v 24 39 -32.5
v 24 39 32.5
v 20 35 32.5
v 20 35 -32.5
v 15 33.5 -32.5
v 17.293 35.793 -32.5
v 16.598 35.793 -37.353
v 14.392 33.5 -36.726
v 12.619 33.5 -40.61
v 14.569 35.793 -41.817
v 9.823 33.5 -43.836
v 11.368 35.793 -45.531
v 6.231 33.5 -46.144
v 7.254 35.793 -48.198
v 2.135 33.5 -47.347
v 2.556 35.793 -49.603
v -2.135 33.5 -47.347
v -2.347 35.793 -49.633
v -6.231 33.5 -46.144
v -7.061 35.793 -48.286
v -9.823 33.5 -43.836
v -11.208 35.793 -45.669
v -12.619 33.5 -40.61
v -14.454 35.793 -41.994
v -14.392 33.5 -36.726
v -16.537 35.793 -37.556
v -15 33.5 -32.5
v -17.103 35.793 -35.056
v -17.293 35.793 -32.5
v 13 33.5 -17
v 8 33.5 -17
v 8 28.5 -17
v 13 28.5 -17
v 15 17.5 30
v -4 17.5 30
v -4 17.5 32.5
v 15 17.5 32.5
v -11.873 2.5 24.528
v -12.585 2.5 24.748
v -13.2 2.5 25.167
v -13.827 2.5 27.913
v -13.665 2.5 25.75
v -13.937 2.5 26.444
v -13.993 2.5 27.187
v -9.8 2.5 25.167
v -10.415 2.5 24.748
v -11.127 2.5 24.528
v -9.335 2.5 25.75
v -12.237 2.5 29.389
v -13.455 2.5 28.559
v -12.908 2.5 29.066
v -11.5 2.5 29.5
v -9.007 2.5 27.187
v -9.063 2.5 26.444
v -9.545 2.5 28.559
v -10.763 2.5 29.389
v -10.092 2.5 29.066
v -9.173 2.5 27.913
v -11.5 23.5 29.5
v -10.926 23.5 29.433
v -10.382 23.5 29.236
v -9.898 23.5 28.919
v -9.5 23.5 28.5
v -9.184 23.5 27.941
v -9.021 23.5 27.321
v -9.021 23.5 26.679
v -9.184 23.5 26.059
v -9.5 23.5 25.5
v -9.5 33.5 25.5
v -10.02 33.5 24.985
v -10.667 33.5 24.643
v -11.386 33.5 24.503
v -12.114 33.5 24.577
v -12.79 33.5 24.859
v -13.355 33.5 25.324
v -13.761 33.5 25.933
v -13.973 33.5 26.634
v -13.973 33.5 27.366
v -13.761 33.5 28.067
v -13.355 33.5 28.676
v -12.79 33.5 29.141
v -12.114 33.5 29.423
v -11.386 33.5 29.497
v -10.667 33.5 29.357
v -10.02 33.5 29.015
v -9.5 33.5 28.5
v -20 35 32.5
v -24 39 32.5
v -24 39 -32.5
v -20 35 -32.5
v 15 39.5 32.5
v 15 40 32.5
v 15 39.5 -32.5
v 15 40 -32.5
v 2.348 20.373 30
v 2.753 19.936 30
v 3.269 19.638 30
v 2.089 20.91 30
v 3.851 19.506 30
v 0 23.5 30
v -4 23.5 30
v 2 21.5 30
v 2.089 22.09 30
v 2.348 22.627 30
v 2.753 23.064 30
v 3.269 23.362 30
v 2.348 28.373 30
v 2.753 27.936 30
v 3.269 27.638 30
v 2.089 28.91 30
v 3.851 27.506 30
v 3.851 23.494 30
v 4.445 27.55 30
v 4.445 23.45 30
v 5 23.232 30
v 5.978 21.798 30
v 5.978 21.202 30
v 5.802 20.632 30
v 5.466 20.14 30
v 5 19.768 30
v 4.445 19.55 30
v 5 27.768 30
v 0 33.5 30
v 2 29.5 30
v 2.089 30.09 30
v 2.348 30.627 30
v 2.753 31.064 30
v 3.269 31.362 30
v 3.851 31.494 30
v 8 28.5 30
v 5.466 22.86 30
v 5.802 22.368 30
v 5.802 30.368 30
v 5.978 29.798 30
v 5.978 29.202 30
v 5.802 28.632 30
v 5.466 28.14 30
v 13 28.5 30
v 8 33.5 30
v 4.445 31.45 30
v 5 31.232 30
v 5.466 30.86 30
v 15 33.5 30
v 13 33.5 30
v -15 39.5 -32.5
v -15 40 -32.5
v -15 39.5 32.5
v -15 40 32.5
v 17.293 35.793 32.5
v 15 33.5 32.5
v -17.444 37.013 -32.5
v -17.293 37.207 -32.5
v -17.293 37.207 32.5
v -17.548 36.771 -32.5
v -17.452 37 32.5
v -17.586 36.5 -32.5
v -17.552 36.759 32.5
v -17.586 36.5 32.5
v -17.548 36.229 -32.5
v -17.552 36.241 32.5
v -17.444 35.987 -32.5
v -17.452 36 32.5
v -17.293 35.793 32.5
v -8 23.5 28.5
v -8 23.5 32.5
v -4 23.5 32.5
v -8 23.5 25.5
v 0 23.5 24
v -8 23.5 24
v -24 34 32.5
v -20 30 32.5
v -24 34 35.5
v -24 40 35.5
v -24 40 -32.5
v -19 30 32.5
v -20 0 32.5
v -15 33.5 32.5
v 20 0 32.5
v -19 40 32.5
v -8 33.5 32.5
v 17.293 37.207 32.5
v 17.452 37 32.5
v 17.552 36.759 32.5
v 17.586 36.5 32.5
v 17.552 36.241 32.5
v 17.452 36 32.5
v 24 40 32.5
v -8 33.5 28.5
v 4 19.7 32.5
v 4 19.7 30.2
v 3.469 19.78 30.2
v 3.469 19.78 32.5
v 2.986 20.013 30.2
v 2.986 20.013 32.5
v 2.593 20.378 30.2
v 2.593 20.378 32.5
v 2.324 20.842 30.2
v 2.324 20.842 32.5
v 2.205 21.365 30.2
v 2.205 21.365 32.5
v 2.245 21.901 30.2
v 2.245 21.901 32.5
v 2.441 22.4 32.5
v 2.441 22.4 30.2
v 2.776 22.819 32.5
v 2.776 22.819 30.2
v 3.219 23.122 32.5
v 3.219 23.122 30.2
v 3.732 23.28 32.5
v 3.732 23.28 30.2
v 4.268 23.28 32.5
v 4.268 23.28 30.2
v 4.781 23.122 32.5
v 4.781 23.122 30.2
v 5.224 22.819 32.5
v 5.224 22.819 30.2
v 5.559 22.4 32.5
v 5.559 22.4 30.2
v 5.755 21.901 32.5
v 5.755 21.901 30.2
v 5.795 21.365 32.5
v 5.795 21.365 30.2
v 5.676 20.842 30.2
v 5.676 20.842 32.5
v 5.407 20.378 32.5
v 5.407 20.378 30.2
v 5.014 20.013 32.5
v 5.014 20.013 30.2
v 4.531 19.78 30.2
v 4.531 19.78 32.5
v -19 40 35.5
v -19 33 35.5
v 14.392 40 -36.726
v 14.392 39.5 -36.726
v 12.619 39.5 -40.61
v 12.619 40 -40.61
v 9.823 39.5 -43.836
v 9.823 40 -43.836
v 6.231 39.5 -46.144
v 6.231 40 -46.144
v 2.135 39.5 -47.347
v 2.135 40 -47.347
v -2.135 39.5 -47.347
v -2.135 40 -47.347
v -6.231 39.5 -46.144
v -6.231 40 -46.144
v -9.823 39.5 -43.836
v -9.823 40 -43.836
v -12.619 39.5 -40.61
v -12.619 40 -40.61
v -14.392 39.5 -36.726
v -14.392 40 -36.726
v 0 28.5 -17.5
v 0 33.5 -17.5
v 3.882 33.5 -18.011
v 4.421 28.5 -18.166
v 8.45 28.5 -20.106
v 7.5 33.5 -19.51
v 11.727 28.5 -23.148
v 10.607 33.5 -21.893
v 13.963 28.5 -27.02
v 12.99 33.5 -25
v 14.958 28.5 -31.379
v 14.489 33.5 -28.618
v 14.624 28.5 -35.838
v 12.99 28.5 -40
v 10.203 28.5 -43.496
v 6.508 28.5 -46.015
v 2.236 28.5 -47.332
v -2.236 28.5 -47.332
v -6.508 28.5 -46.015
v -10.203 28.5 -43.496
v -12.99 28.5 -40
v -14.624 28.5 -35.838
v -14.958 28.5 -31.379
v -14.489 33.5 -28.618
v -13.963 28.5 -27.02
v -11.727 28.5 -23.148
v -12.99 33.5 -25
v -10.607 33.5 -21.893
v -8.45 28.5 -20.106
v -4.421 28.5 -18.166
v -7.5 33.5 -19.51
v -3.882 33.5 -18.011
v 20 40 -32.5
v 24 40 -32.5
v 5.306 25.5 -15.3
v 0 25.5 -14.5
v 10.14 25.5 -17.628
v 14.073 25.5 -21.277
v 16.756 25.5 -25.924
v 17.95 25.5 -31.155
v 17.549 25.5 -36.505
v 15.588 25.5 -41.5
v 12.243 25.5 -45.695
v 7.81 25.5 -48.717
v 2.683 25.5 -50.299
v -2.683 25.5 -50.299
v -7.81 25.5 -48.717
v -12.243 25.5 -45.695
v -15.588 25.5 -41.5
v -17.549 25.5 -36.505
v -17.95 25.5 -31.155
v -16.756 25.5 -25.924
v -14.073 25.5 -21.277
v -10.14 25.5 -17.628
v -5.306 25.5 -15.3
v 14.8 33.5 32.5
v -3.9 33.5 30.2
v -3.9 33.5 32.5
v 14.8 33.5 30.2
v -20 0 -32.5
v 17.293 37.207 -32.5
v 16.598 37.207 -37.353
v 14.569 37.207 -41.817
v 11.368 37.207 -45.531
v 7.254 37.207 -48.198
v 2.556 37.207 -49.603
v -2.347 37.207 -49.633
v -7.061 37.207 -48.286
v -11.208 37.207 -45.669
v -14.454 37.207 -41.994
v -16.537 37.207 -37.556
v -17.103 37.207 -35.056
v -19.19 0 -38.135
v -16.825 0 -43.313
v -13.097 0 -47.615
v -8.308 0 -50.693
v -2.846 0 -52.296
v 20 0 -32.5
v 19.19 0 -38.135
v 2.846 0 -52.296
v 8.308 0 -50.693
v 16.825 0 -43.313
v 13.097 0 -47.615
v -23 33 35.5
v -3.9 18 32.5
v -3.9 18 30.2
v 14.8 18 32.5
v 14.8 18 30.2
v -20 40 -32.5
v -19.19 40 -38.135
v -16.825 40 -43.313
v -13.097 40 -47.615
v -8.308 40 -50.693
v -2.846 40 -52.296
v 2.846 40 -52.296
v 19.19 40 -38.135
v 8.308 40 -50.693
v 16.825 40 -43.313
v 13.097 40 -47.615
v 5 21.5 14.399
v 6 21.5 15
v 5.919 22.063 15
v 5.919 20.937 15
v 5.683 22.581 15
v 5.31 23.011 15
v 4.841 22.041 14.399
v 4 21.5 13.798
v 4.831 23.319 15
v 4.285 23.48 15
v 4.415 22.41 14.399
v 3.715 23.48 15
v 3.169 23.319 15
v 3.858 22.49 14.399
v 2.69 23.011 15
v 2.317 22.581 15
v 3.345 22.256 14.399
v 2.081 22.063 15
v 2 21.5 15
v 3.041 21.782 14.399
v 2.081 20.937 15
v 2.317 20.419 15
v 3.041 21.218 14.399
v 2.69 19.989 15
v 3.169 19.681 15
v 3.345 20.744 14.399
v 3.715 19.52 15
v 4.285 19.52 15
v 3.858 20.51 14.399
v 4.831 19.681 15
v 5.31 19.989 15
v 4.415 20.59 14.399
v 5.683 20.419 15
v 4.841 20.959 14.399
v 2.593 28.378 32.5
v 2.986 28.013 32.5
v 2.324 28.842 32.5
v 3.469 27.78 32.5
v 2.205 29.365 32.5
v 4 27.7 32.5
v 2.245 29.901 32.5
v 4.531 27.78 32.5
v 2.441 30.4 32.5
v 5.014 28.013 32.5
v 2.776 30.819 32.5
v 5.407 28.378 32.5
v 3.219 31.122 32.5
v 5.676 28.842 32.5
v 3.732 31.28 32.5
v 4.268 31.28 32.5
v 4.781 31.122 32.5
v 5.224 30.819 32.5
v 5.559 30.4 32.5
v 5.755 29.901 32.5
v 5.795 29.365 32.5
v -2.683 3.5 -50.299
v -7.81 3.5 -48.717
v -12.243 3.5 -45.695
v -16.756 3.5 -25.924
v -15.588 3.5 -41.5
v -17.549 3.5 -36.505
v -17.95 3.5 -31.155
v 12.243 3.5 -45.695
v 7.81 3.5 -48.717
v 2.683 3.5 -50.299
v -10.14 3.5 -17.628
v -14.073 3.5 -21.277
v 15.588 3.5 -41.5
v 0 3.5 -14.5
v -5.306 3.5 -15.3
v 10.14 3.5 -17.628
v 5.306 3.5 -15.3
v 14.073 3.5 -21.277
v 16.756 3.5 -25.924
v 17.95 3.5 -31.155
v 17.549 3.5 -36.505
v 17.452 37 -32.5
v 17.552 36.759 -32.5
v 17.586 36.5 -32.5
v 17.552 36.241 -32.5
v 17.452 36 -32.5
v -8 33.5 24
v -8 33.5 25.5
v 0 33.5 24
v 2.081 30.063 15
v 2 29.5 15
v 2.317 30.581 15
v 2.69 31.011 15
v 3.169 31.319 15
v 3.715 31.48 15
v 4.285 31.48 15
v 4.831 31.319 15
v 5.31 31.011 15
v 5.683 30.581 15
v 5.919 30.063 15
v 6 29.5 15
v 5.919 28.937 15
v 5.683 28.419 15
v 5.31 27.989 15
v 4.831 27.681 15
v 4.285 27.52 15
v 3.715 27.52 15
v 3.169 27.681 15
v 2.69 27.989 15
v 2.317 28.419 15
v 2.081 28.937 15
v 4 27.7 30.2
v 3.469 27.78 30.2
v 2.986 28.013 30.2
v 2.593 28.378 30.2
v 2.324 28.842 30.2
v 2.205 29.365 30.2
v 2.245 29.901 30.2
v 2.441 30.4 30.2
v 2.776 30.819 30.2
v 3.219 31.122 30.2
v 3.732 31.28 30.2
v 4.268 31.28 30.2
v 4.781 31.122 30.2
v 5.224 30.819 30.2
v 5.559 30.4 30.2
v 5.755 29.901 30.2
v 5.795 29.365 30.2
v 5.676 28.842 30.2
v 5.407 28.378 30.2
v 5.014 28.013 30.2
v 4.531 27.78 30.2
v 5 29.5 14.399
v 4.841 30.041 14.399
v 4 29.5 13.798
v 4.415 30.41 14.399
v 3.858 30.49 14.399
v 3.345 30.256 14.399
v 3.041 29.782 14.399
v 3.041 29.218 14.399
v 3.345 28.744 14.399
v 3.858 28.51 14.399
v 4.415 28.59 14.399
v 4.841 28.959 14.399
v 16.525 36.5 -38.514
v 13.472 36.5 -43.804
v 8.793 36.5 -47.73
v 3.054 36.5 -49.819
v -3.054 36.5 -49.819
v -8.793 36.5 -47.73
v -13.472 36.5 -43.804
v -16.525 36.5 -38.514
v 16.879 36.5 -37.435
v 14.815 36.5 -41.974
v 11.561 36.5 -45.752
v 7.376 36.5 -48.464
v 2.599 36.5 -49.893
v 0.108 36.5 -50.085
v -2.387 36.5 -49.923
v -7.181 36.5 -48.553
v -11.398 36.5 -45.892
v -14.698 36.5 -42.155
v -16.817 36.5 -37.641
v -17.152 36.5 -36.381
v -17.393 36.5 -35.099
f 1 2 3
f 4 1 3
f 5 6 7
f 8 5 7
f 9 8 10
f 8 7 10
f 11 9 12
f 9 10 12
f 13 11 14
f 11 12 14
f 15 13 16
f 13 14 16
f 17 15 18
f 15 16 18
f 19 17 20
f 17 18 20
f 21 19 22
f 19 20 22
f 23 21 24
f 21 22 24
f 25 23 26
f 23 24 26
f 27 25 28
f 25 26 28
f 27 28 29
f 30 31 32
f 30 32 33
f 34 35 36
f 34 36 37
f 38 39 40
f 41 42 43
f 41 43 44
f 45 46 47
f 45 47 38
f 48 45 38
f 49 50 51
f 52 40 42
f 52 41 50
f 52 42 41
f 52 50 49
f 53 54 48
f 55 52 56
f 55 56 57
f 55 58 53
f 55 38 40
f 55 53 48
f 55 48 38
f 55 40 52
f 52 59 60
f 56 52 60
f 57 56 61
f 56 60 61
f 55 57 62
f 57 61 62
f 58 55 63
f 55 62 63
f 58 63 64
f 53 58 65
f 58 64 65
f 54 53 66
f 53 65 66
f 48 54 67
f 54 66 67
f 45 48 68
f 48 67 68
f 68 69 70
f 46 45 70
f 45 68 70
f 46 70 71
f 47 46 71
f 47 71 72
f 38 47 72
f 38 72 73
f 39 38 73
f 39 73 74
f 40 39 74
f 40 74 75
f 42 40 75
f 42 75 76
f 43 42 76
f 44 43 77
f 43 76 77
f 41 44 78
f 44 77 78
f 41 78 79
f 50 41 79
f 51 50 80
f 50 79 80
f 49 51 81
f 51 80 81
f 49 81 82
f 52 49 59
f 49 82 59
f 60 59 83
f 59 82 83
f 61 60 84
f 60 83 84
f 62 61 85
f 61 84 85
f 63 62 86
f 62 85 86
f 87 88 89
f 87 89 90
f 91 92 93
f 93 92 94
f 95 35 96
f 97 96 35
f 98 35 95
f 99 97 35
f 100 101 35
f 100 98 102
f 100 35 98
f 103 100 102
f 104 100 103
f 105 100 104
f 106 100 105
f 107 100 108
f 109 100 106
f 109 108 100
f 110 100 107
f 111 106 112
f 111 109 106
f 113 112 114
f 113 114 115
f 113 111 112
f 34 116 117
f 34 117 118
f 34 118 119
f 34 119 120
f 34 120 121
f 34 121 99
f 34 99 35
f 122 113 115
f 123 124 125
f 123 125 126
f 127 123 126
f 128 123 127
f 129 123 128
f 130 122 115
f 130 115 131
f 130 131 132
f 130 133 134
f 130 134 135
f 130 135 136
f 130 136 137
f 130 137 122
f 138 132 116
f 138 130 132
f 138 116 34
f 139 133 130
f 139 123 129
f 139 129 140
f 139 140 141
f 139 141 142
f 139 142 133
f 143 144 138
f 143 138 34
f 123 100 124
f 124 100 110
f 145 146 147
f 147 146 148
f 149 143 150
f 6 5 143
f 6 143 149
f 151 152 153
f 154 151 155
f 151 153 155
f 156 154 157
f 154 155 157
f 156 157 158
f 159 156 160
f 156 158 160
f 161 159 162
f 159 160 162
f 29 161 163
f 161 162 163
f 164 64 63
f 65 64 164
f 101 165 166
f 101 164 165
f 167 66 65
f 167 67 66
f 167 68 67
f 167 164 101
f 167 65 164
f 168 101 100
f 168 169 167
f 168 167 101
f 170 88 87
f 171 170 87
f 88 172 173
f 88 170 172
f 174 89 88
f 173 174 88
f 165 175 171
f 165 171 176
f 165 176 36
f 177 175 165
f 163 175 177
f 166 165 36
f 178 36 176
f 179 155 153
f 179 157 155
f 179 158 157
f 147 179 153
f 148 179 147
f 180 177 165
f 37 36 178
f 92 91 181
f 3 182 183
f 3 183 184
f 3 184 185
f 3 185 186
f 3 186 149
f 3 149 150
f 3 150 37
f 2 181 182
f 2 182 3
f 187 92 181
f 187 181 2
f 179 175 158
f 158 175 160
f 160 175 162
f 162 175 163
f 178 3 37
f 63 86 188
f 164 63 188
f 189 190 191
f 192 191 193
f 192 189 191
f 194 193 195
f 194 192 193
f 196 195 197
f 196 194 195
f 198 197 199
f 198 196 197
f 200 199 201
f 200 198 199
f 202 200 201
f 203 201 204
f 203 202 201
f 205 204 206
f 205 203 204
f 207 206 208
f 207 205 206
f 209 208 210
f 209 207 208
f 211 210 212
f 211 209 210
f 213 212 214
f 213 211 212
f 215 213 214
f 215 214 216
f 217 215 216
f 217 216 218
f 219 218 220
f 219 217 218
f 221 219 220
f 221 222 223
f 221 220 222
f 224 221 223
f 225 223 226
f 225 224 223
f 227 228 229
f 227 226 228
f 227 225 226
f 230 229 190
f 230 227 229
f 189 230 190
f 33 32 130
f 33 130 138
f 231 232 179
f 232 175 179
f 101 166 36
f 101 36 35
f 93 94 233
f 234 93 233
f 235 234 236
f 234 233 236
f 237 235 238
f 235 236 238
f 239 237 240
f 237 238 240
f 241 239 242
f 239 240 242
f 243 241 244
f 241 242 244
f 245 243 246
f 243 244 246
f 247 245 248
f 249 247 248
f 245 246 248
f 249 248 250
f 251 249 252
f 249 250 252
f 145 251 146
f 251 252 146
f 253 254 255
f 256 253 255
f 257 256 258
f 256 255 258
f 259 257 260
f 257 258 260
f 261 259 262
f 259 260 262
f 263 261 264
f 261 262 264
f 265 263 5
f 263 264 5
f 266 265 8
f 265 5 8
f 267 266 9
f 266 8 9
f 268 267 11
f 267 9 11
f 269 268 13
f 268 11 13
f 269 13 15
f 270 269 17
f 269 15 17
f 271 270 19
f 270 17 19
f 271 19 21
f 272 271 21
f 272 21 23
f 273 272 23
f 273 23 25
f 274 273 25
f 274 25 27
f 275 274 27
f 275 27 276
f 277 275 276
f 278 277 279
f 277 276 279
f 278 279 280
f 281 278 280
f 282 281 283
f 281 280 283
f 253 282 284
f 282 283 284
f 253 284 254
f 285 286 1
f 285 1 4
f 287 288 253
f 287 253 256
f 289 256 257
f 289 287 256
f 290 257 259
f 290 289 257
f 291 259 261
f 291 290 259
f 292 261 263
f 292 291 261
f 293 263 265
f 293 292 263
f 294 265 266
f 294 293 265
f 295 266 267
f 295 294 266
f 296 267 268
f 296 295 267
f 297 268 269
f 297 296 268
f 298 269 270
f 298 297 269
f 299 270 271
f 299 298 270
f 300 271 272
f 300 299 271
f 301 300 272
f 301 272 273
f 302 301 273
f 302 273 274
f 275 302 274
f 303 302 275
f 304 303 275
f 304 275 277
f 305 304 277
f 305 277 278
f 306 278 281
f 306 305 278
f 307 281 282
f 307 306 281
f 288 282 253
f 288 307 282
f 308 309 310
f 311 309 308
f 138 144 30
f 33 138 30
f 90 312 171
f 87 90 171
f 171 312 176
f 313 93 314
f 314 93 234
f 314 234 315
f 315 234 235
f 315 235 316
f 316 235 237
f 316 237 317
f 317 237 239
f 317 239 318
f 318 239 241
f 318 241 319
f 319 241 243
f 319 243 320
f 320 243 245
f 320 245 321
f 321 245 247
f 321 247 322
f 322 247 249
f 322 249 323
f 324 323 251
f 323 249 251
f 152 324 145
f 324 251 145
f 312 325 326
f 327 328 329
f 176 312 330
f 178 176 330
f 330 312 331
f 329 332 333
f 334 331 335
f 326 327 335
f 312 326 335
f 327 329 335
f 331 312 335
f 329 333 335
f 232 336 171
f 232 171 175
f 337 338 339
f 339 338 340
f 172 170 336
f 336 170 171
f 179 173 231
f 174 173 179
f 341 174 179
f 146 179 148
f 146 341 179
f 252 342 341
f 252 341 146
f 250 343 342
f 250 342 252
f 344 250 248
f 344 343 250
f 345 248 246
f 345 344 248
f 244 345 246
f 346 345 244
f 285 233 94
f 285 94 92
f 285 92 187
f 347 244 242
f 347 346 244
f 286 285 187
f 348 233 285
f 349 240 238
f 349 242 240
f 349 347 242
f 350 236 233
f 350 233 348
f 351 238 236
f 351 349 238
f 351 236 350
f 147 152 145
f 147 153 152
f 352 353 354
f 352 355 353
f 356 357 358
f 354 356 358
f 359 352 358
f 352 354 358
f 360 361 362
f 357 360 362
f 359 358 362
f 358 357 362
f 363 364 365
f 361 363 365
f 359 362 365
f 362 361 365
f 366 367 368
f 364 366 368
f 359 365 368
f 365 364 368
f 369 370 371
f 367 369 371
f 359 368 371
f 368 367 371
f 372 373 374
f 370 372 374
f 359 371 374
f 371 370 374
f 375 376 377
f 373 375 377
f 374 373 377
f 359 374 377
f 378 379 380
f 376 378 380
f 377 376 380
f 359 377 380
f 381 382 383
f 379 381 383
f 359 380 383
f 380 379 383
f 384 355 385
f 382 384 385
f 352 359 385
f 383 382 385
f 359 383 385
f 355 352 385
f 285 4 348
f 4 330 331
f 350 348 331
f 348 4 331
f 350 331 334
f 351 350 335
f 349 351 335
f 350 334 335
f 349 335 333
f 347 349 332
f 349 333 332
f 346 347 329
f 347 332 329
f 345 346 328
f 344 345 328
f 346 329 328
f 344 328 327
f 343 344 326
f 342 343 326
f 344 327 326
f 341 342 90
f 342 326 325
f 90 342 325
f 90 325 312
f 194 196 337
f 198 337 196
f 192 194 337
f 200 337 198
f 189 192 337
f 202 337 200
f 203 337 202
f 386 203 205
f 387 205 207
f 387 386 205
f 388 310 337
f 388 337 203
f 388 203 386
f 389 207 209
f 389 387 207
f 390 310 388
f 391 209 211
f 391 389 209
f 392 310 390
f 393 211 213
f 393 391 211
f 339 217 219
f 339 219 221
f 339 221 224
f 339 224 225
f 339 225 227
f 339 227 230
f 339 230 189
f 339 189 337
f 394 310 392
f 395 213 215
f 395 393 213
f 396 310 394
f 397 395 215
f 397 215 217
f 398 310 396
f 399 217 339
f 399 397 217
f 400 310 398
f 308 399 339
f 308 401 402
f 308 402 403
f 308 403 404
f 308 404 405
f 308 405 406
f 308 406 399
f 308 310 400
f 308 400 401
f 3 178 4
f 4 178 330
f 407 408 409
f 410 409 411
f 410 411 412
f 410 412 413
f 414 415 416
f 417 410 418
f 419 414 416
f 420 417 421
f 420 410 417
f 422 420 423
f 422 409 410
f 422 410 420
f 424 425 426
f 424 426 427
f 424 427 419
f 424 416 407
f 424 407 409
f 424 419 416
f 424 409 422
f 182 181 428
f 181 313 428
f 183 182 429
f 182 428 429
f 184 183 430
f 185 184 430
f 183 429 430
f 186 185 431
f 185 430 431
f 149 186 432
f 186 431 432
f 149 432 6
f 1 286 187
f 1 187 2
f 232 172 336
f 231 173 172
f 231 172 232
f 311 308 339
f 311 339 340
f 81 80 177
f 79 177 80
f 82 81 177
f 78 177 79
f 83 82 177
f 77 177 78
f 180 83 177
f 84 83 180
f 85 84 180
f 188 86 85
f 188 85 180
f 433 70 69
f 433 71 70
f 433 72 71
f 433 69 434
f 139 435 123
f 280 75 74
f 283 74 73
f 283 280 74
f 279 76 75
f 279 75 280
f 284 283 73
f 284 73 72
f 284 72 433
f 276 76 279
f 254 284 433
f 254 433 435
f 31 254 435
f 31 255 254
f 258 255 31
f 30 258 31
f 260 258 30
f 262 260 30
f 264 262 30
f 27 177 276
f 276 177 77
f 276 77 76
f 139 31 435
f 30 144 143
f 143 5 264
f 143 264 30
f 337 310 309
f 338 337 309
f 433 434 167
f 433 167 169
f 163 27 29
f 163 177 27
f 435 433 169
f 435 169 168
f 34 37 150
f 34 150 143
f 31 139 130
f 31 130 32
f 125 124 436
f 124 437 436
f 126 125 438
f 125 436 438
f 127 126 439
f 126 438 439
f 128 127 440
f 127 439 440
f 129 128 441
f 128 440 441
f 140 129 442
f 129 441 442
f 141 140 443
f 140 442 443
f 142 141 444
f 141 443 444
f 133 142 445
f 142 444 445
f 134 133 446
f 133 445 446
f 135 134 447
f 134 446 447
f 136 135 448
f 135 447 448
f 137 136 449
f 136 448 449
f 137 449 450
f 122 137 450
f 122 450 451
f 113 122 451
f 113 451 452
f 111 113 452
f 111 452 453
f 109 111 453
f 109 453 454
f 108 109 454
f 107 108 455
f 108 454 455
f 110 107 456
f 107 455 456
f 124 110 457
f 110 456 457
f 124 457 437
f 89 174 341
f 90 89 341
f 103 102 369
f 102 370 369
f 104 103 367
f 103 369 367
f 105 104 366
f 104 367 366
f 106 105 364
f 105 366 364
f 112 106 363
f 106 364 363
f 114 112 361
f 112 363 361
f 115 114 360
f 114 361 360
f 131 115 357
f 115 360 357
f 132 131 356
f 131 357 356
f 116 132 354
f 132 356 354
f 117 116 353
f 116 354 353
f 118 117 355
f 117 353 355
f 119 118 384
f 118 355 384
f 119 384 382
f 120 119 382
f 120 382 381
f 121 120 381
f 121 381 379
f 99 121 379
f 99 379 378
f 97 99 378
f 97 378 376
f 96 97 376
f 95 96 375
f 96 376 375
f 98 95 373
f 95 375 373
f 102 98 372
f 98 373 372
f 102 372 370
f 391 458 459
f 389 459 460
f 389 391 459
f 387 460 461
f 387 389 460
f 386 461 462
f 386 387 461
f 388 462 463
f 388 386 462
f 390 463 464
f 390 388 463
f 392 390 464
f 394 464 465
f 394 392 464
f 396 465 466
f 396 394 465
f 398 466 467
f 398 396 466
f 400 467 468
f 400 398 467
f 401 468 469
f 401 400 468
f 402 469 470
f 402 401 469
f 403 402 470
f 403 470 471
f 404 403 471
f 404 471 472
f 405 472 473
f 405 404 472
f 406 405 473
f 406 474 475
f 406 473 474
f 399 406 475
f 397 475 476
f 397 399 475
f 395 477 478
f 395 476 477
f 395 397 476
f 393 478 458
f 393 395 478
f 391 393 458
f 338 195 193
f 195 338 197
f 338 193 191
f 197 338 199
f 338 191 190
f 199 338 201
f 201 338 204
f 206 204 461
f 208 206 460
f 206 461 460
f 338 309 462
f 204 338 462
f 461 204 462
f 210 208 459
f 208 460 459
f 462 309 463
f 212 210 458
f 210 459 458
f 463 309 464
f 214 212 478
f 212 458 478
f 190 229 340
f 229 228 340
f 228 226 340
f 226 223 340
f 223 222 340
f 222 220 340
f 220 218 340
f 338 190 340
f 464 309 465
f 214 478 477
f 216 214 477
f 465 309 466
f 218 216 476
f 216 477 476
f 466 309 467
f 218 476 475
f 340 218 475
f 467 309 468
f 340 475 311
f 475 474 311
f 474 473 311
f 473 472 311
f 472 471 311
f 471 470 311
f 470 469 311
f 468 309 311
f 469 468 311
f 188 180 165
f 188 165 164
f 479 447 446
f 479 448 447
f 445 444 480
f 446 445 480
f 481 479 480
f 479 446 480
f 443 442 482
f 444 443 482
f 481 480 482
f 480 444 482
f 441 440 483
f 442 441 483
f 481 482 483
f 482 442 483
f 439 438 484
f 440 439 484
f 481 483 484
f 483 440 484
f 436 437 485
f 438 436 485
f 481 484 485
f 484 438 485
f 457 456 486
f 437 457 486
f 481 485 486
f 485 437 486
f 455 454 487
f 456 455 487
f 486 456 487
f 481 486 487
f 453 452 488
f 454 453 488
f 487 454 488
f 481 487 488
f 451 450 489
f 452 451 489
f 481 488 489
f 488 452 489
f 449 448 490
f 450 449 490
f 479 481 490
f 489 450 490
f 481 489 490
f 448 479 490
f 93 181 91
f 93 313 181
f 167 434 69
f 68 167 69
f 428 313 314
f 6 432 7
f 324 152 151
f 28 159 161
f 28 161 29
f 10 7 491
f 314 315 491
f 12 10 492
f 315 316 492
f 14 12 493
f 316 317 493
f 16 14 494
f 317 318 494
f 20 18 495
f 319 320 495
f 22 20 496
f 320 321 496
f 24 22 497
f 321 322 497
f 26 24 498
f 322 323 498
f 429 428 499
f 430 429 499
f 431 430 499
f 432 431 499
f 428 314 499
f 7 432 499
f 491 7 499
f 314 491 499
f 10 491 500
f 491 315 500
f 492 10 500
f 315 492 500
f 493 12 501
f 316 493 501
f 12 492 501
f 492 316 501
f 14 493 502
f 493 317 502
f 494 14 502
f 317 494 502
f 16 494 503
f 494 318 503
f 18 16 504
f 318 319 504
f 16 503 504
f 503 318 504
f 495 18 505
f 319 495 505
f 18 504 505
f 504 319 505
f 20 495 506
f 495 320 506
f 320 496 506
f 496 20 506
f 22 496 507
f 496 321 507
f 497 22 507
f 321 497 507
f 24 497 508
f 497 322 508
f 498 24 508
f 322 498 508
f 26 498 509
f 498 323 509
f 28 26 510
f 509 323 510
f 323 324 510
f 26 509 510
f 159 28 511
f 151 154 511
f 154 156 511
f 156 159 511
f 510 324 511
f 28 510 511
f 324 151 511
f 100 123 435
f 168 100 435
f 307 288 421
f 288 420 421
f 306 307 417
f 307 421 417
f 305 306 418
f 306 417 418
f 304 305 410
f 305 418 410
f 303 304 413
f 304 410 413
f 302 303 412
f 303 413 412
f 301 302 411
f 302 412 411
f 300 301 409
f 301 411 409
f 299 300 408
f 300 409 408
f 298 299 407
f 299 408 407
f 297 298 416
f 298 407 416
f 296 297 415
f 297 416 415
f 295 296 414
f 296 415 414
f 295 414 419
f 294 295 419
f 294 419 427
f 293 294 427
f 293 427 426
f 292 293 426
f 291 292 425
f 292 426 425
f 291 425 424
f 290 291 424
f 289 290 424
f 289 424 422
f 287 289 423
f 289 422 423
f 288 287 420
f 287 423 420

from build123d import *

# Parameters (mm, degrees)
DODANIE_WYCI_GNI_CIE1_DEPTH         = 40
WYTNIJ_WYCI_GNI_CIE1_DEPTH          = 6.5
SZKIC6_R                            = 15
WYTNIJ_WYCI_GNI_CIE2_DEPTH          = 30
SZKIC7_R                            = 18
WYTNIJ_WYCI_GNI_CIE4_DEPTH          = 20
SFAZOWANIE1_SIZE                    = 5
SZKIC8_W                            = 5
SZKIC8_H                            = 47
WYTNIJ_WYCI_GNI_CIE5_DEPTH          = 5
ZAOKR_GLENIE2_R                     = 1
SZKIC10_W                           = 8
SZKIC10_H                           = 6
WYTNIJ_WYCI_GNI_CIE6_DEPTH          = 10
SZKIC11_R                           = 2.5
WYTNIJ_WYCI_GNI_CIE7_DEPTH          = 21
SZKIC12_W                           = 4
SZKIC12_H                           = 2.5
WYTNIJ_WYCI_GNI_CIE8_DEPTH          = 10
DODANIE_WYCI_GNI_CIE2_DEPTH         = 65
SZKIC16_W                           = 5
SZKIC16_H                           = 10
DODANIE_WYCI_GNI_CIE3_DEPTH         = 3
SFAZOWANIE4_SIZE                    = 4
SFAZOWANIE5_SIZE                    = 3
SZKIC17_W                           = 19
SZKIC17_H                           = 2.5
WYTNIJ_WYCI_GNI_CIE9_DEPTH          = 16
OTWORY_USTALAJ_CE_4_0MM5_D          = 4
OTWORY_USTALAJ_CE_4_0MM5_DEPTH      = 15
OTWORY_USTALAJ_CE_4_0MM5_TIP        = 1.201721238
SZKIC23_W                           = 18.7
SZKIC23_H                           = 2.3
DODANIE_WYCI_GNI_CIE4_DEPTH         = 15.5
OTWORY_USTALAJ_CE_4_0MM6_AT_2_COUNT = 2
OTWORY_USTALAJ_CE_4_0MM6_AT_2_PITCH = 8


# Some blends are built 0.0001 mm under size
with BuildPart() as part:
    # Szkic1 → Dodanie-wyciągnięcie1 (new body)
    with BuildSketch(Plane(origin=(0, 0, 0), x_dir=(1, 0, 0), z_dir=(0, 1, 0))):
        with BuildLine():
            ThreePointArc((20, 32.5), (0, 12.5), (-20, 32.5))
            Line((-20, 32.5), (-20, -32.5))
            Line((-20, -32.5), (20, -32.5))
            Line((20, -32.5), (20, 32.5))
        make_face()
        with BuildLine():
            ThreePointArc((20, 32.5), (0, 52.5), (-20, 32.5))
            Line((-20, 32.5), (20, 32.5))
        make_face()
        with BuildLine():
            Line((20, 32.5), (-20, 32.5))
            ThreePointArc((-20, 32.5), (0, 12.5), (20, 32.5))
        make_face()
    extrude(amount=DODANIE_WYCI_GNI_CIE1_DEPTH)

    # Szkic2 → Wytnij-wyciągnięcie1 (cut)
    with BuildSketch(Plane(origin=(0, 40, 0), x_dir=(1, 0, 0), z_dir=(0, 1, 0))):
        with BuildLine():
            Line((-15, -32.5), (15, -32.5))
            Line((15, -32.5), (15, 32.5))
            ThreePointArc((15, 32.5), (0, 47.5), (-15, 32.5))
            Line((-15, 32.5), (-15, -32.5))
        make_face()
    extrude(amount=-WYTNIJ_WYCI_GNI_CIE1_DEPTH, mode=Mode.SUBTRACT)

    # Wycięcie-wyciągnięcie po ścieżce1: sweep along a path in Szkic5
    with BuildLine(Plane(origin=(0, 40, 0), x_dir=(1, 0, 0), z_dir=(0, 1, 0))) as wyci_cie_wyci_gni_cie_po_cie_ce1_path:
        Line((15, -32.5), (15, 32.5))
        ThreePointArc((15, 32.5), (0, 47.5), (-15, 32.5))
        Line((-15, 32.5), (-15, -32.5))
    # Szkic4 → Wycięcie-wyciągnięcie po ścieżce1 (sweep, cut)
    with BuildSketch(Plane.XY.offset(32.5)):
        Polygon((15, 33.5), (18, 36.5), (15, 39.5), align=None)
    sweep(path=wyci_cie_wyci_gni_cie_po_cie_ce1_path.line, mode=Mode.SUBTRACT)

    # Szkic6 → Wytnij-wyciągnięcie2 (cut)
    with BuildSketch(Plane(origin=(0, 33.5, 0), x_dir=(1, 0, 0), z_dir=(0, 1, 0))):
        with Locations(Location((0, 32.5, 0), (0, 0, 270))):
            Circle(SZKIC6_R)
    extrude(amount=-WYTNIJ_WYCI_GNI_CIE2_DEPTH, mode=Mode.SUBTRACT)

    # Szkic7 → Wytnij-wyciągnięcie4 (cut)
    with BuildSketch(Plane(origin=(0, 3.5, 0), x_dir=(1, 0, 0), z_dir=(0, 1, 0))):
        with Locations(Location((0, 32.5, 0), (0, 0, 270))):
            Circle(SZKIC7_R)
    extrude(amount=WYTNIJ_WYCI_GNI_CIE4_DEPTH, mode=Mode.SUBTRACT)

    # Sfazowanie1
    # the kernel refuses this chamfer: 5 mm, written as the material it takes off along each edge
    with BuildSketch(Plane(origin=(0, 23.5, -32.5), x_dir=(0, 0, 1), z_dir=(-1, 0, 0))) as sfazowanie1_piece_1_section:
        Polygon((15, SFAZOWANIE1_SIZE), (15 + SFAZOWANIE1_SIZE, 0), (15, 0), align=None)
    sfazowanie1_piece_1 = revolve(axis=Axis((0, 23.5, -32.5), (0, 1, 0)), mode=Mode.PRIVATE)
    sfazowanie1_piece_1 = sfazowanie1_piece_1 & Plane(origin=(0, 26.996373783, -32.5), x_dir=(0, 0, 1), z_dir=(0, -1, 0)) * Cylinder(18, 81, mode=Mode.PRIVATE)
    add(sfazowanie1_piece_1, mode=Mode.SUBTRACT)

    # Szkic8 → Wytnij-wyciągnięcie5 (cut)
    with BuildSketch(Plane(origin=(0, 33.5, 0), x_dir=(1, 0, 0), z_dir=(0, 1, 0))):
        with Locations((10.5, -6.5)):
            Rectangle(SZKIC8_W, SZKIC8_H)
    extrude(amount=-WYTNIJ_WYCI_GNI_CIE5_DEPTH, mode=Mode.SUBTRACT)

    # Zaokrąglenie2
    zaokr_glenie2_edges = [part.edges().sort_by_distance(p)[0] for p in [
        (18, 36.5, 0),
        (0, 36.5, -50.5),
        (-18, 36.5, 0),
    ]]
    fillet(zaokr_glenie2_edges, radius=ZAOKR_GLENIE2_R)

    # Szkic10 → Wytnij-wyciągnięcie6 (cut)
    with BuildSketch(Plane(origin=(0, 33.5, 0), x_dir=(1, 0, 0), z_dir=(0, 1, 0))):
        with BuildLine():
            ThreePointArc((-9.5, -25.5), (-14, -27), (-9.5, -28.5))
            Line((-9.5, -28.5), (-9.5, -25.5))
        make_face()
        with BuildLine():
            Line((-9.5, -25.5), (-9.5, -28.5))
            ThreePointArc((-9.5, -28.5), (-9.128291755, -27.790569415), (-9, -27))
            ThreePointArc((-9, -27), (-9.128291755, -26.209430585), (-9.5, -25.5))
        make_face()
        with Locations((-4, -27)):
            Rectangle(SZKIC10_W, SZKIC10_H)
        with BuildLine():
            Line((-9.5, -28.5), (-8, -28.5))
            Line((-8, -28.5), (-8, -25.5))
            Line((-8, -25.5), (-9.5, -25.5))
            ThreePointArc((-9.5, -25.5), (-9.128291755, -26.209430585), (-9, -27))
            ThreePointArc((-9, -27), (-9.128291755, -27.790569415), (-9.5, -28.5))
        make_face()
    extrude(amount=-WYTNIJ_WYCI_GNI_CIE6_DEPTH, mode=Mode.SUBTRACT)

    # Szkic11 → Wytnij-wyciągnięcie7 (cut)
    with BuildSketch(Plane(origin=(0, 23.5, 0), x_dir=(1, 0, 0), z_dir=(0, 1, 0))):
        with Locations(Location((-11.5, -27, 0), (0, 0, 270))):
            Circle(SZKIC11_R)
    extrude(amount=-WYTNIJ_WYCI_GNI_CIE7_DEPTH, mode=Mode.SUBTRACT)

    # Szkic12 → Wytnij-wyciągnięcie8 (cut)
    with BuildSketch(Plane(origin=(0, 33.5, 0), x_dir=(1, 0, 0), z_dir=(0, 1, 0))):
        with Locations((-6, -31.25)):
            Rectangle(SZKIC12_W, SZKIC12_H)
    extrude(amount=-WYTNIJ_WYCI_GNI_CIE8_DEPTH, mode=Mode.SUBTRACT)

    # Szkic13 → Dodanie-wyciągnięcie2 (add)
    with BuildSketch(Plane.XY.offset(32.5)):
        Polygon((-20, 40), (-24, 40), (-24, 39), (-20, 35), align=None)
        Polygon((20, 35), (20, 40), (24, 40), (24, 39), align=None)
    extrude(amount=-DODANIE_WYCI_GNI_CIE2_DEPTH)

    # Szkic16 → Dodanie-wyciągnięcie3 (add)
    with BuildSketch(Plane.XY.offset(32.5)):
        with Locations((-21.5, 35)):
            Rectangle(SZKIC16_W, SZKIC16_H)
    extrude(amount=DODANIE_WYCI_GNI_CIE3_DEPTH)

    # Sfazowanie4
    sfazowanie4_edges = [part.edges().sort_by_distance(p)[0] for p in [
        (-24, 30, 34),
    ]]
    chamfer(sfazowanie4_edges, length=SFAZOWANIE4_SIZE)

    # Sfazowanie5
    sfazowanie5_edges = [part.edges().sort_by_distance(p)[0] for p in [
        (-19.5, 30, 35.5),
    ]]
    chamfer(sfazowanie5_edges, length=SFAZOWANIE5_SIZE - 0.0001)  # a hair under: the kernel refuses the full size

    # Szkic17 → Wytnij-wyciągnięcie9 (cut)
    with BuildSketch(Plane(origin=(0, 33.5, 0), x_dir=(1, 0, 0), z_dir=(0, 1, 0))):
        with Locations((5.5, -31.25)):
            Rectangle(SZKIC17_W, SZKIC17_H)
    extrude(amount=-WYTNIJ_WYCI_GNI_CIE9_DEPTH, mode=Mode.SUBTRACT)

    # Otwory ustalające Ø4.0mm5
    with Locations(Plane.XY.offset(30)):
        with Locations((4, 29.5), (4, 21.5)):
            Hole(OTWORY_USTALAJ_CE_4_0MM5_D / 2, depth=OTWORY_USTALAJ_CE_4_0MM5_DEPTH)
            with Locations((0, 0, -(OTWORY_USTALAJ_CE_4_0MM5_DEPTH + OTWORY_USTALAJ_CE_4_0MM5_TIP / 2))):  # 118° drill point
                Cone(0, OTWORY_USTALAJ_CE_4_0MM5_D / 2, OTWORY_USTALAJ_CE_4_0MM5_TIP, mode=Mode.SUBTRACT)


with BuildPart() as body_2:
    # Szkic23 → Dodanie-wyciągnięcie4 (new body)
    with BuildSketch(Plane(origin=(0, 33.5, 0), x_dir=(1, 0, 0), z_dir=(0, 1, 0))):
        with Locations((5.45, -31.35)):
            Rectangle(SZKIC23_W, SZKIC23_H)
    extrude(amount=-DODANIE_WYCI_GNI_CIE4_DEPTH)

    # Szkic25 → Otwory ustalające Ø4.0mm6 (revolve, cut)
    with BuildSketch(Plane(origin=(4, 21.5, 32.5), x_dir=(0, -1, 0), z_dir=(1, 0, 0))):
        Polygon((0, 0), (0, 16.081549114), (1.8, 15), (1.8, 0), align=None)
    otwory_ustalaj_ce_4_0mm6 = revolve(axis=Axis((4, 21.5, 38.85), (0, 0, -1)), mode=Mode.SUBTRACT)

    # Otwory ustalające Ø4.0mm6 at 2: Otwory ustalające Ø4.0mm6 ×2
    with Locations(*[(0, i * OTWORY_USTALAJ_CE_4_0MM6_AT_2_PITCH, 0) for i in range(1, OTWORY_USTALAJ_CE_4_0MM6_AT_2_COUNT)]):
        add(otwory_ustalaj_ce_4_0mm6, mode=Mode.SUBTRACT)


solid = Compound([part.part, body_2.part])
